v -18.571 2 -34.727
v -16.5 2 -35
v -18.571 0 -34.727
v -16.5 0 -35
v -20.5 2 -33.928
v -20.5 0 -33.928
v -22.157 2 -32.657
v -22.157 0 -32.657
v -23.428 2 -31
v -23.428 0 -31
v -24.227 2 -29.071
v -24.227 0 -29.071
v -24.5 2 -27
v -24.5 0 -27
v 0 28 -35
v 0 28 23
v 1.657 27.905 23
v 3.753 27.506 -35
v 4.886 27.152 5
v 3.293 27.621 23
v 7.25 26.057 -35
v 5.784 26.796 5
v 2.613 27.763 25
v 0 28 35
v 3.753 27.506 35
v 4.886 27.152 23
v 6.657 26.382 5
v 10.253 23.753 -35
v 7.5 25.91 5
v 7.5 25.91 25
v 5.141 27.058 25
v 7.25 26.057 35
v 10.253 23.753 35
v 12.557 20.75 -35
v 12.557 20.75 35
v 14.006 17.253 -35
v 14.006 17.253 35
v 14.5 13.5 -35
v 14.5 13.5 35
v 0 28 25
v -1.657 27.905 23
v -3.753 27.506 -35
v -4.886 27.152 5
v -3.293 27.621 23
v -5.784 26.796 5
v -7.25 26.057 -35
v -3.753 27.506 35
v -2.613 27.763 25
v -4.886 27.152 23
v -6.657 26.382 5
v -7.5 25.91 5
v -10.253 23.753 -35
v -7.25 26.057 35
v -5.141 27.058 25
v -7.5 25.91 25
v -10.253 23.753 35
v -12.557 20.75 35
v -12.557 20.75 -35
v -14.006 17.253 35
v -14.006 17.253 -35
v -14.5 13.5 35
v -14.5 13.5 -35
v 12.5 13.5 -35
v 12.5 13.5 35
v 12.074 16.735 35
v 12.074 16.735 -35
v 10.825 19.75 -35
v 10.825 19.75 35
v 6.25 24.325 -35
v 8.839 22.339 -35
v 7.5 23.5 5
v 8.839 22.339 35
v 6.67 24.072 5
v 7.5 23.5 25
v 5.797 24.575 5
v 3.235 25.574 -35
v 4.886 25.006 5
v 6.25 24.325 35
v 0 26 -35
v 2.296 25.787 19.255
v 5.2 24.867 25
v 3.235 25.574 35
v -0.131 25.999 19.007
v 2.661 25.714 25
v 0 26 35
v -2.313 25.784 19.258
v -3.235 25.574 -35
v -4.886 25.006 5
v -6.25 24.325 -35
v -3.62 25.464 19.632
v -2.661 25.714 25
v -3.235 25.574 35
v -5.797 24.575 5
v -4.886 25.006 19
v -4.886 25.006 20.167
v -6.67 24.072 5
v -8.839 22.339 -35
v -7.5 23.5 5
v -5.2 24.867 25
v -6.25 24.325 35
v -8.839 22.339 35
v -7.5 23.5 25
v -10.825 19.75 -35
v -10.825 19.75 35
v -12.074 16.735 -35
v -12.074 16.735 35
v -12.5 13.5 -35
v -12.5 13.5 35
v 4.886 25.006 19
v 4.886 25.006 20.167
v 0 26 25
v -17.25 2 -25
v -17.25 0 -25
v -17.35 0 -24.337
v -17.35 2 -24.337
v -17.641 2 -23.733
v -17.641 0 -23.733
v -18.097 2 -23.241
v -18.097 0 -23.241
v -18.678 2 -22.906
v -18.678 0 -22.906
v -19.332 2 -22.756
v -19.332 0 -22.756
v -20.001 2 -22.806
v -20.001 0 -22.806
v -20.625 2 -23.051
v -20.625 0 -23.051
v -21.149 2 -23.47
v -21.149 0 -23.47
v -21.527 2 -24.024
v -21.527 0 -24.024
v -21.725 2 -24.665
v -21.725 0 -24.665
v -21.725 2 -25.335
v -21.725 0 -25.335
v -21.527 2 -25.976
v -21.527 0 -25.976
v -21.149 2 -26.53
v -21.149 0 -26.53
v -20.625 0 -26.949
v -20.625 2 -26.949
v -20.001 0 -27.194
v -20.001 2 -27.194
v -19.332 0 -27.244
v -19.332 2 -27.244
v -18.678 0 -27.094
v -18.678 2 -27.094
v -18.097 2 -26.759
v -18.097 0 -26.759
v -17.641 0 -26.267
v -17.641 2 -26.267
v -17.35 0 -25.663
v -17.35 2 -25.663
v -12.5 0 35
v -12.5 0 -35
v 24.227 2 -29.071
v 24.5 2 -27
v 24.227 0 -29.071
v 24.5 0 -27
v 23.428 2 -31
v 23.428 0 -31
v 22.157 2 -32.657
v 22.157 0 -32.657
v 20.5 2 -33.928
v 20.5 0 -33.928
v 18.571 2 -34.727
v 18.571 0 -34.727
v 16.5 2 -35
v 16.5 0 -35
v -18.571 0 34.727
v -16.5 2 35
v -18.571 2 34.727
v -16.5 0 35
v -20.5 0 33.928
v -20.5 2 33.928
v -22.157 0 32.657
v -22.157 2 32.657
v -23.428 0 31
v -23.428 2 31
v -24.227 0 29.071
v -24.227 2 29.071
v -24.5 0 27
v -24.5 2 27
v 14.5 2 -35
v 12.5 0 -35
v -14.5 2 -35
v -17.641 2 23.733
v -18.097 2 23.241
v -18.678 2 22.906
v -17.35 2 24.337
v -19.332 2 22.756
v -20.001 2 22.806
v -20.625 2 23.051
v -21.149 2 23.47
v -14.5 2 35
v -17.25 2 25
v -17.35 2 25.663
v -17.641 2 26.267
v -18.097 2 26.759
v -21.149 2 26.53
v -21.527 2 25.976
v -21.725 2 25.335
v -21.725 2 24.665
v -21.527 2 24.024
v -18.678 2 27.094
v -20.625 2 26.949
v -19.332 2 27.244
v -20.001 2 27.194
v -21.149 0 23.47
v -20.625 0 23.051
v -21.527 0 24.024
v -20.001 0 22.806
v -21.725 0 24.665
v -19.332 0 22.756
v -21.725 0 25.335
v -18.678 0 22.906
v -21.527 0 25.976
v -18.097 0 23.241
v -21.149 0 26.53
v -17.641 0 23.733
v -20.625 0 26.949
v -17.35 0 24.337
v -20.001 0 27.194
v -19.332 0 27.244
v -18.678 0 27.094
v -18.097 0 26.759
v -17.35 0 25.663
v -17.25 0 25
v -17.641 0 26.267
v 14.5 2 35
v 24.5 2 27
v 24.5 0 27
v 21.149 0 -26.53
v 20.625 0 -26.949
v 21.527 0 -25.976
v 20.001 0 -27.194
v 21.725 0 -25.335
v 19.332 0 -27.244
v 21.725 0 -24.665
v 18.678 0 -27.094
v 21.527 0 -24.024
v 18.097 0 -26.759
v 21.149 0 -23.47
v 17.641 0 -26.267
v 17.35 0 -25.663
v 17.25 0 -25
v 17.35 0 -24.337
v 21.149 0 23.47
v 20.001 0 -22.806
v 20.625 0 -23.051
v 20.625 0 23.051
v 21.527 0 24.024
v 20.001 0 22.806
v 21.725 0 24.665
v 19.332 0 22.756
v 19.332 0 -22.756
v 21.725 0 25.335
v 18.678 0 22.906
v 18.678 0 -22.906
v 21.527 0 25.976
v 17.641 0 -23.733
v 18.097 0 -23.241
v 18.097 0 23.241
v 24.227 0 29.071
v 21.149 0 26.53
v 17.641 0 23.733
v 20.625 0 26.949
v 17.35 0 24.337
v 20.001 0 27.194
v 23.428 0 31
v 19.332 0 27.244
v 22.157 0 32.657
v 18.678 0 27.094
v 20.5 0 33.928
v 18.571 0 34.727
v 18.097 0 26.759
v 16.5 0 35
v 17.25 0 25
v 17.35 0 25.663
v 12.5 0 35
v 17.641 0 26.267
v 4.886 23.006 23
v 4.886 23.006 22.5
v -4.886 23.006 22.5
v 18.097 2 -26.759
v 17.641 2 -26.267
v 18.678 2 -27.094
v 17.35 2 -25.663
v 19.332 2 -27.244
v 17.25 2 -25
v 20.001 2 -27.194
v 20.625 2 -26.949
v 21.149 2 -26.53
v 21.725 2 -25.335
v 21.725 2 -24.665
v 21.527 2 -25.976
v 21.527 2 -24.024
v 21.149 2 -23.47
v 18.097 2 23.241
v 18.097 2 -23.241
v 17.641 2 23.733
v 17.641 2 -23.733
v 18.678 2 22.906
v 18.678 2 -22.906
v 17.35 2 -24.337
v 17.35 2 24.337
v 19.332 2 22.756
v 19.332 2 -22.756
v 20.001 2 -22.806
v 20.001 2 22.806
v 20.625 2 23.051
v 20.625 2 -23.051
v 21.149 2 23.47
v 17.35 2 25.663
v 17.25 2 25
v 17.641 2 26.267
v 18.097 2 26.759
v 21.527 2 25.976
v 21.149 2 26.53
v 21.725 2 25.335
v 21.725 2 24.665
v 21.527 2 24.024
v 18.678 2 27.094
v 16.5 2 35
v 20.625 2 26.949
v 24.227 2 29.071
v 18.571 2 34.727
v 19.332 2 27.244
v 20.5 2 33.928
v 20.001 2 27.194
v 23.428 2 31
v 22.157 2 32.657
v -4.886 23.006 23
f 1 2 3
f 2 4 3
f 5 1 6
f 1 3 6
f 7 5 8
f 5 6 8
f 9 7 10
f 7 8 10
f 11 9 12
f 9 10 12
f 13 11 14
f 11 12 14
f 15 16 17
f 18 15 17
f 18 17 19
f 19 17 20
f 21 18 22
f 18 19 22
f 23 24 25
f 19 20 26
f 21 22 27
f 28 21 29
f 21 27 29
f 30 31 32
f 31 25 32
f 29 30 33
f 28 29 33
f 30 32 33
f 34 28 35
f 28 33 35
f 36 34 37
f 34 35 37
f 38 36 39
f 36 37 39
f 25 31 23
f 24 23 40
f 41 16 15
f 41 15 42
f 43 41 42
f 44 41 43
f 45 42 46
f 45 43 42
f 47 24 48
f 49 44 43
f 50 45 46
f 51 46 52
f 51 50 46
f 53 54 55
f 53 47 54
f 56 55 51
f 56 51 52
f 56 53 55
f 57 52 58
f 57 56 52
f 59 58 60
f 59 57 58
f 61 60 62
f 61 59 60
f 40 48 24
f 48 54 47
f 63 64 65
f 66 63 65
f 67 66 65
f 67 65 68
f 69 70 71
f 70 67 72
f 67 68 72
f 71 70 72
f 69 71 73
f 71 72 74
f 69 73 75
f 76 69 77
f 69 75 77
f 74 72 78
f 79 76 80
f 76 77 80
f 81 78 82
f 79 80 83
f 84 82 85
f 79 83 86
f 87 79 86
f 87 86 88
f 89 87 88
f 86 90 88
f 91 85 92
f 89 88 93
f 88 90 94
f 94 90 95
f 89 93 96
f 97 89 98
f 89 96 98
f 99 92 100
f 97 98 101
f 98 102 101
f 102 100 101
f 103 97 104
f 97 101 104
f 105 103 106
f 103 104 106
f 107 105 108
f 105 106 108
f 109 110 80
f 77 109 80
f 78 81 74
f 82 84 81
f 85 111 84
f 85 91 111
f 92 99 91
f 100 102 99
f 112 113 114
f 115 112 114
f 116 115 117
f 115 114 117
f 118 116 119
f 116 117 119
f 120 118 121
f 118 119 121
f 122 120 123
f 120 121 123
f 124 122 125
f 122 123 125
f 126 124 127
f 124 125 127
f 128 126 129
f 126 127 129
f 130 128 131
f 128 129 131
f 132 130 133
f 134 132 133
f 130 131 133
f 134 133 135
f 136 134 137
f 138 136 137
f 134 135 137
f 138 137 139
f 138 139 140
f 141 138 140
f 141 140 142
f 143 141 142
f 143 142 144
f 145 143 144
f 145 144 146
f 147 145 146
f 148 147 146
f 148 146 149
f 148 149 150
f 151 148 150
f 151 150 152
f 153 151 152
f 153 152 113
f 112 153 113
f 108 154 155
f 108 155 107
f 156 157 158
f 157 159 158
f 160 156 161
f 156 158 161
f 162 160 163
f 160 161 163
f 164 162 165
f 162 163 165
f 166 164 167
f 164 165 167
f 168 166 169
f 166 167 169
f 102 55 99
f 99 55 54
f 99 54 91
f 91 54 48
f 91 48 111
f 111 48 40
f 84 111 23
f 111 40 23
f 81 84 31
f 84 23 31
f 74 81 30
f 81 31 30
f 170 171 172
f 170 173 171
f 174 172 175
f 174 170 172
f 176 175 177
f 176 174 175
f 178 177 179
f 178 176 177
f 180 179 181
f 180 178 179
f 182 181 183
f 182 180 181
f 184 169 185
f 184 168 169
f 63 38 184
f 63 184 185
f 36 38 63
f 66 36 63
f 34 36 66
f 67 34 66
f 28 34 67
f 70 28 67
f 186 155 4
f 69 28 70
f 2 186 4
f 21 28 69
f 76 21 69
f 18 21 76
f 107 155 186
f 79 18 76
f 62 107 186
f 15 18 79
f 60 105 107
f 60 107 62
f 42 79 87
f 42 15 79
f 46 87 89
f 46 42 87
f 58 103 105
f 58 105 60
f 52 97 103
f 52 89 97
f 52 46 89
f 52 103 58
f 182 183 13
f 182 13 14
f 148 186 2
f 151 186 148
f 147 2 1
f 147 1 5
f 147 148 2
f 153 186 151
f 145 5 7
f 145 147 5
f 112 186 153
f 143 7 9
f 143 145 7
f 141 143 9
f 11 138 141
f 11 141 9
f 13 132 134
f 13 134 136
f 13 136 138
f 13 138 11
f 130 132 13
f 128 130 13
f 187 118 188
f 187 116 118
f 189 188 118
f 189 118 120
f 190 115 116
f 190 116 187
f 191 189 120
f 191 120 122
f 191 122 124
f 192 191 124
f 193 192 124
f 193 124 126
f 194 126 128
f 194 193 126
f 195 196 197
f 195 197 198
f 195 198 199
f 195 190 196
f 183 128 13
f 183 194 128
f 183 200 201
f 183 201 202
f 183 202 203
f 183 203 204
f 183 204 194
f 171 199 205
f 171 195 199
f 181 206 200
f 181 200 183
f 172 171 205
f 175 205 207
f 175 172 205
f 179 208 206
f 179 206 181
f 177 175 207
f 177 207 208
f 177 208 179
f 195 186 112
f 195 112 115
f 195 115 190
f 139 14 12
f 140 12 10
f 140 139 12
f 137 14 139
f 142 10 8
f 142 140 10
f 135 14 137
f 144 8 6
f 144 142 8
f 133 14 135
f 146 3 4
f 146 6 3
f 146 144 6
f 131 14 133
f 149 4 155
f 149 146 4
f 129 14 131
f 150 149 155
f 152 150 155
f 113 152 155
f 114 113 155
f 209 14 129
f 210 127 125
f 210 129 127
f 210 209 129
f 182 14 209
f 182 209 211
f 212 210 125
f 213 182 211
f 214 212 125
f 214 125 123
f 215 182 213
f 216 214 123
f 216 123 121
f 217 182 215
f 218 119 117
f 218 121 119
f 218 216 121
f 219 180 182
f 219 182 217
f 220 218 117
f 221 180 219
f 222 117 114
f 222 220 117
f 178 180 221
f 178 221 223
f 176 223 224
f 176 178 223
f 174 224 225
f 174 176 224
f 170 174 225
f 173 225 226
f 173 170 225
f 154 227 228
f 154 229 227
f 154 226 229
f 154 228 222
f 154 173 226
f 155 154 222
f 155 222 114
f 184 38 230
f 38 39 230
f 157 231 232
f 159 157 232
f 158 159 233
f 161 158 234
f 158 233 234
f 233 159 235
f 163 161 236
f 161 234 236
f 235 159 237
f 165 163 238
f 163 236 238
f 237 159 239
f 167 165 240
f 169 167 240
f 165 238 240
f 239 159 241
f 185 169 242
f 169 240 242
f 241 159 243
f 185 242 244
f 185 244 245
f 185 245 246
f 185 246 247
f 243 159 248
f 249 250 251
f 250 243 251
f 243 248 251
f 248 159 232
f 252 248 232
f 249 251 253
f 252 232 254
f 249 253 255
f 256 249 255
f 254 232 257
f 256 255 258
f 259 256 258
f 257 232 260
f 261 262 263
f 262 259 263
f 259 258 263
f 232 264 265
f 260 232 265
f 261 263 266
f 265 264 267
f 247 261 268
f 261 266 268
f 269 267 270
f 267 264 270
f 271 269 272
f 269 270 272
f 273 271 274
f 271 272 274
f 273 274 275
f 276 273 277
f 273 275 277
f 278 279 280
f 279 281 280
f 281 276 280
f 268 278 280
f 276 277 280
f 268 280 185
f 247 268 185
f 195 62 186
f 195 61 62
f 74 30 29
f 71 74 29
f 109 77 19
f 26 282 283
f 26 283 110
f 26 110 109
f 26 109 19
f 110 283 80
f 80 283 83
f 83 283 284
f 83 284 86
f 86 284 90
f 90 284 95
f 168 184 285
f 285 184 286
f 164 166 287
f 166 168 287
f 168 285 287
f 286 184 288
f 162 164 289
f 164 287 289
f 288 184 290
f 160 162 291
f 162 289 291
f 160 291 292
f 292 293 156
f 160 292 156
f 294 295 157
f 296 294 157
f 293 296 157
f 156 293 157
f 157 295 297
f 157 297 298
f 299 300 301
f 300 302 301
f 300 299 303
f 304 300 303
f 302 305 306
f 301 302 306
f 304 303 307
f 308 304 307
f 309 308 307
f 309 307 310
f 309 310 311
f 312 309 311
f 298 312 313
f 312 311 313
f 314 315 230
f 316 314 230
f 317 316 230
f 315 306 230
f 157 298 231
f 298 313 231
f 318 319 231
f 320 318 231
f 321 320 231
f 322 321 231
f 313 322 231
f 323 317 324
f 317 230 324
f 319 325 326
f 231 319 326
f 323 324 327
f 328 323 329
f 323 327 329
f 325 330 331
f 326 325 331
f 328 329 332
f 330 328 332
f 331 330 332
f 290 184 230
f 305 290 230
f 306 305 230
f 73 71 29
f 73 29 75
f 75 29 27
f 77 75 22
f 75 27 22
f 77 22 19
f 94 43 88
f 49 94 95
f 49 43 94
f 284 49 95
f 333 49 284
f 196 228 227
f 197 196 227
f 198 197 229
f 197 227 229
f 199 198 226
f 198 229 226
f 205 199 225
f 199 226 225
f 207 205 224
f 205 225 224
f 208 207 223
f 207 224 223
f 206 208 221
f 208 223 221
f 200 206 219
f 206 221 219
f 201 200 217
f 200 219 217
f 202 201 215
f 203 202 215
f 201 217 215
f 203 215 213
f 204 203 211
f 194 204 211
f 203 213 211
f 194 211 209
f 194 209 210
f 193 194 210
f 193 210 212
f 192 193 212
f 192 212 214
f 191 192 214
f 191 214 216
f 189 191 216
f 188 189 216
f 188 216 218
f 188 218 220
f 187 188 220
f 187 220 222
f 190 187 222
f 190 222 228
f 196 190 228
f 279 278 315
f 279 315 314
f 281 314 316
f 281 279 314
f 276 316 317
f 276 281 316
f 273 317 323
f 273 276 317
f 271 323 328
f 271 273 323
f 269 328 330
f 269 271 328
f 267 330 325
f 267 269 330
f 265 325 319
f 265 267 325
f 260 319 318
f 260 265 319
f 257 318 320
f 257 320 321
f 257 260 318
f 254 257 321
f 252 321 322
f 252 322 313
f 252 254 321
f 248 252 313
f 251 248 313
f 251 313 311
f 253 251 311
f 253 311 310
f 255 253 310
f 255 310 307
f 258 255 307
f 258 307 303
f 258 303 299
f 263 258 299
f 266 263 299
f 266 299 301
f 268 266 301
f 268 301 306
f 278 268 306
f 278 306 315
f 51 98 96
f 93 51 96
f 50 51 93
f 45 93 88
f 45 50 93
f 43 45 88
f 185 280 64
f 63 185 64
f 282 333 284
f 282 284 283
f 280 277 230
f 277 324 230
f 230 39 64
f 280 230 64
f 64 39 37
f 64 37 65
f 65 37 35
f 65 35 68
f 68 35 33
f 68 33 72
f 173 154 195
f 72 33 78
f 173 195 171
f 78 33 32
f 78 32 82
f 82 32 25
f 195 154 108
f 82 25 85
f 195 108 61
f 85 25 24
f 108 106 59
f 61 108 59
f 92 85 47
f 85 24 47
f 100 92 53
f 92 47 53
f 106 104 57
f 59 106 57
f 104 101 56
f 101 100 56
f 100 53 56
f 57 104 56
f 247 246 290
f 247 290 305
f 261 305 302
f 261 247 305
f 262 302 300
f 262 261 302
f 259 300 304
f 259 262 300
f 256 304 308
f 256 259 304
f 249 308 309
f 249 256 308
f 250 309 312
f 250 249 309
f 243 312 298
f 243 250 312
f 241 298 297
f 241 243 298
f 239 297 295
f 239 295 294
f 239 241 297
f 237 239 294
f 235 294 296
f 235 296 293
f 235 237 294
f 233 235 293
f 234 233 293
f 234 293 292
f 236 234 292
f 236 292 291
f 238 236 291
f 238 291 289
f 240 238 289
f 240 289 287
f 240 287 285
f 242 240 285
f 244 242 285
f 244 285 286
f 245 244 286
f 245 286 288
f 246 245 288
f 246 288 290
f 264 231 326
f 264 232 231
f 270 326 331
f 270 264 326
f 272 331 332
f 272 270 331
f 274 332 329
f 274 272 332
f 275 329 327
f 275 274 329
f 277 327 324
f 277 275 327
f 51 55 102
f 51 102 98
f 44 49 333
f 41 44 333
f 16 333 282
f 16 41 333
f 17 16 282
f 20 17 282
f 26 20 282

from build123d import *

# Parameters (mm, degrees)
F1_DEPTH     = 35
F3_D         = 4.5
F7_REACH     = 50.3610093633
F8_R         = 8
F10_DEPTH    = 4
F11_T4_DEPTH = 27.8083046081
F11_S5_R     = 12.5
F11_T6_DEPTH = 16


# Not quite as in the source:
# - a fillet or chamfer that OpenCascade refuses, or shapes differently, is made with other operations: its cross-section is extruded or revolved along the edge and cut away or added
# - a pattern or mirror of a feature is missing from the dataset's text; its kind, count and spacing are read off the source's solid


with BuildPart() as f1:
    # F0 (on Top) → F1 (new body, symmetric)
    with BuildSketch(Plane.XY):
        with BuildLine():
            Line((-24.5, 2), (-24.5, 0))
            Line((-24.5, 0), (-12.5, 0))
            Line((-12.5, 0), (-12.5, 13.5))
            ThreePointArc((-12.5, 13.5), (-8.8388347648, 22.3388347648), (0, 26))
            Line((0, 26), (0, 28))
            ThreePointArc((0, 28), (-10.2530483272, 23.7530483272), (-14.5, 13.5))
            Line((-14.5, 13.5), (-14.5, 2))
            Line((-14.5, 2), (-24.5, 2))
        make_face()
    extrude(amount=F1_DEPTH, both=True)

    # F3 (through all)
    with Locations(Plane(origin=(0, 2, 0), x_dir=(-1, 0, 0), z_dir=(0, 1, 0))):
        with Locations((19.5, -25), (19.5, 25)):
            Hole(F3_D / 2)

    # F4: F1 across plane


with BuildPart() as f1_1:
    add(f1.part)
    add(f1.part.mirror(Plane.YZ))

    f7_end = f1_1.faces().sort_by_distance((0, 26, 0))[0]
    # F6 (on offset) → F7 (cut, up to a face of the model that its end follows)
    with BuildSketch(Plane.XZ.offset(-29)):
        Polygon((0, 23), (0, 25), (-7.5, 25), (-7.5, 5), (-4.8855356313, 5), (-4.8855356313, 23), align=None)
    f7_long = extrude(amount=F7_REACH, mode=Mode.PRIVATE)
    f7 = split(f7_long, bisect_by=f7_end, keep=Keep.BOTTOM, mode=Mode.PRIVATE)
    add(f7, mode=Mode.SUBTRACT)

    # F7_copies: F7 across plane
    add(f7.mirror(Plane(origin=(0, 0, 0), x_dir=(0, 0, 1), z_dir=(1, 0, 0))), mode=Mode.SUBTRACT)

    # F8
    f8_edges = [f1_1.edges().sort_by_distance(p)[0] for p in [
        (-24.5, 1, -35),
        (24.5, 1, -35),
        (-24.5, 1, 35),
        (24.5, 1, 35),
    ]]
    fillet(f8_edges, radius=F8_R)

    # F9 (on face) → F10 (join)
    with BuildSketch(Plane.XY.offset(23)):
        with BuildLine():
            ThreePointArc((4.8855356313, 25.0057177783), (0, 26), (-4.8855356313, 25.0057177783))
            Line((-4.8855356313, 25.0057177783), (-4.8855356313, 23.0057177783))
            Line((-4.8855356313, 23.0057177783), (4.8855356313, 23.0057177783))
            Line((4.8855356313, 23.0057177783), (4.8855356313, 25.0057177783))
        make_face()
    extrude(amount=-F10_DEPTH)

    # F11: chamfer of 3 x 3.5 on 1 edges, made by hand


with BuildPart() as f11_tool2:
    # F11_s3 → F11_t4 (new body)
    with BuildSketch(Plane.YZ.offset(-13.9041523041)):
        Polygon((23.0057177783, 22.5), (26.0057177783, 19), (23.0057177783, 19), align=None)
    extrude(amount=F11_T4_DEPTH)

    # F11_s5 → F11_t6 (intersect, symmetric)
    with BuildSketch(Plane.XY.offset(20.8)):
        with Locations((0, 13.5)):
            Circle(F11_S5_R)
    extrude(amount=F11_T6_DEPTH, both=True, mode=Mode.INTERSECT)


with BuildPart() as f1_2:
    add(f1_1.part)

    # F11_t1: cut F11_tool2
    add(f11_tool2.part, mode=Mode.SUBTRACT)


solid = f1_2.part
